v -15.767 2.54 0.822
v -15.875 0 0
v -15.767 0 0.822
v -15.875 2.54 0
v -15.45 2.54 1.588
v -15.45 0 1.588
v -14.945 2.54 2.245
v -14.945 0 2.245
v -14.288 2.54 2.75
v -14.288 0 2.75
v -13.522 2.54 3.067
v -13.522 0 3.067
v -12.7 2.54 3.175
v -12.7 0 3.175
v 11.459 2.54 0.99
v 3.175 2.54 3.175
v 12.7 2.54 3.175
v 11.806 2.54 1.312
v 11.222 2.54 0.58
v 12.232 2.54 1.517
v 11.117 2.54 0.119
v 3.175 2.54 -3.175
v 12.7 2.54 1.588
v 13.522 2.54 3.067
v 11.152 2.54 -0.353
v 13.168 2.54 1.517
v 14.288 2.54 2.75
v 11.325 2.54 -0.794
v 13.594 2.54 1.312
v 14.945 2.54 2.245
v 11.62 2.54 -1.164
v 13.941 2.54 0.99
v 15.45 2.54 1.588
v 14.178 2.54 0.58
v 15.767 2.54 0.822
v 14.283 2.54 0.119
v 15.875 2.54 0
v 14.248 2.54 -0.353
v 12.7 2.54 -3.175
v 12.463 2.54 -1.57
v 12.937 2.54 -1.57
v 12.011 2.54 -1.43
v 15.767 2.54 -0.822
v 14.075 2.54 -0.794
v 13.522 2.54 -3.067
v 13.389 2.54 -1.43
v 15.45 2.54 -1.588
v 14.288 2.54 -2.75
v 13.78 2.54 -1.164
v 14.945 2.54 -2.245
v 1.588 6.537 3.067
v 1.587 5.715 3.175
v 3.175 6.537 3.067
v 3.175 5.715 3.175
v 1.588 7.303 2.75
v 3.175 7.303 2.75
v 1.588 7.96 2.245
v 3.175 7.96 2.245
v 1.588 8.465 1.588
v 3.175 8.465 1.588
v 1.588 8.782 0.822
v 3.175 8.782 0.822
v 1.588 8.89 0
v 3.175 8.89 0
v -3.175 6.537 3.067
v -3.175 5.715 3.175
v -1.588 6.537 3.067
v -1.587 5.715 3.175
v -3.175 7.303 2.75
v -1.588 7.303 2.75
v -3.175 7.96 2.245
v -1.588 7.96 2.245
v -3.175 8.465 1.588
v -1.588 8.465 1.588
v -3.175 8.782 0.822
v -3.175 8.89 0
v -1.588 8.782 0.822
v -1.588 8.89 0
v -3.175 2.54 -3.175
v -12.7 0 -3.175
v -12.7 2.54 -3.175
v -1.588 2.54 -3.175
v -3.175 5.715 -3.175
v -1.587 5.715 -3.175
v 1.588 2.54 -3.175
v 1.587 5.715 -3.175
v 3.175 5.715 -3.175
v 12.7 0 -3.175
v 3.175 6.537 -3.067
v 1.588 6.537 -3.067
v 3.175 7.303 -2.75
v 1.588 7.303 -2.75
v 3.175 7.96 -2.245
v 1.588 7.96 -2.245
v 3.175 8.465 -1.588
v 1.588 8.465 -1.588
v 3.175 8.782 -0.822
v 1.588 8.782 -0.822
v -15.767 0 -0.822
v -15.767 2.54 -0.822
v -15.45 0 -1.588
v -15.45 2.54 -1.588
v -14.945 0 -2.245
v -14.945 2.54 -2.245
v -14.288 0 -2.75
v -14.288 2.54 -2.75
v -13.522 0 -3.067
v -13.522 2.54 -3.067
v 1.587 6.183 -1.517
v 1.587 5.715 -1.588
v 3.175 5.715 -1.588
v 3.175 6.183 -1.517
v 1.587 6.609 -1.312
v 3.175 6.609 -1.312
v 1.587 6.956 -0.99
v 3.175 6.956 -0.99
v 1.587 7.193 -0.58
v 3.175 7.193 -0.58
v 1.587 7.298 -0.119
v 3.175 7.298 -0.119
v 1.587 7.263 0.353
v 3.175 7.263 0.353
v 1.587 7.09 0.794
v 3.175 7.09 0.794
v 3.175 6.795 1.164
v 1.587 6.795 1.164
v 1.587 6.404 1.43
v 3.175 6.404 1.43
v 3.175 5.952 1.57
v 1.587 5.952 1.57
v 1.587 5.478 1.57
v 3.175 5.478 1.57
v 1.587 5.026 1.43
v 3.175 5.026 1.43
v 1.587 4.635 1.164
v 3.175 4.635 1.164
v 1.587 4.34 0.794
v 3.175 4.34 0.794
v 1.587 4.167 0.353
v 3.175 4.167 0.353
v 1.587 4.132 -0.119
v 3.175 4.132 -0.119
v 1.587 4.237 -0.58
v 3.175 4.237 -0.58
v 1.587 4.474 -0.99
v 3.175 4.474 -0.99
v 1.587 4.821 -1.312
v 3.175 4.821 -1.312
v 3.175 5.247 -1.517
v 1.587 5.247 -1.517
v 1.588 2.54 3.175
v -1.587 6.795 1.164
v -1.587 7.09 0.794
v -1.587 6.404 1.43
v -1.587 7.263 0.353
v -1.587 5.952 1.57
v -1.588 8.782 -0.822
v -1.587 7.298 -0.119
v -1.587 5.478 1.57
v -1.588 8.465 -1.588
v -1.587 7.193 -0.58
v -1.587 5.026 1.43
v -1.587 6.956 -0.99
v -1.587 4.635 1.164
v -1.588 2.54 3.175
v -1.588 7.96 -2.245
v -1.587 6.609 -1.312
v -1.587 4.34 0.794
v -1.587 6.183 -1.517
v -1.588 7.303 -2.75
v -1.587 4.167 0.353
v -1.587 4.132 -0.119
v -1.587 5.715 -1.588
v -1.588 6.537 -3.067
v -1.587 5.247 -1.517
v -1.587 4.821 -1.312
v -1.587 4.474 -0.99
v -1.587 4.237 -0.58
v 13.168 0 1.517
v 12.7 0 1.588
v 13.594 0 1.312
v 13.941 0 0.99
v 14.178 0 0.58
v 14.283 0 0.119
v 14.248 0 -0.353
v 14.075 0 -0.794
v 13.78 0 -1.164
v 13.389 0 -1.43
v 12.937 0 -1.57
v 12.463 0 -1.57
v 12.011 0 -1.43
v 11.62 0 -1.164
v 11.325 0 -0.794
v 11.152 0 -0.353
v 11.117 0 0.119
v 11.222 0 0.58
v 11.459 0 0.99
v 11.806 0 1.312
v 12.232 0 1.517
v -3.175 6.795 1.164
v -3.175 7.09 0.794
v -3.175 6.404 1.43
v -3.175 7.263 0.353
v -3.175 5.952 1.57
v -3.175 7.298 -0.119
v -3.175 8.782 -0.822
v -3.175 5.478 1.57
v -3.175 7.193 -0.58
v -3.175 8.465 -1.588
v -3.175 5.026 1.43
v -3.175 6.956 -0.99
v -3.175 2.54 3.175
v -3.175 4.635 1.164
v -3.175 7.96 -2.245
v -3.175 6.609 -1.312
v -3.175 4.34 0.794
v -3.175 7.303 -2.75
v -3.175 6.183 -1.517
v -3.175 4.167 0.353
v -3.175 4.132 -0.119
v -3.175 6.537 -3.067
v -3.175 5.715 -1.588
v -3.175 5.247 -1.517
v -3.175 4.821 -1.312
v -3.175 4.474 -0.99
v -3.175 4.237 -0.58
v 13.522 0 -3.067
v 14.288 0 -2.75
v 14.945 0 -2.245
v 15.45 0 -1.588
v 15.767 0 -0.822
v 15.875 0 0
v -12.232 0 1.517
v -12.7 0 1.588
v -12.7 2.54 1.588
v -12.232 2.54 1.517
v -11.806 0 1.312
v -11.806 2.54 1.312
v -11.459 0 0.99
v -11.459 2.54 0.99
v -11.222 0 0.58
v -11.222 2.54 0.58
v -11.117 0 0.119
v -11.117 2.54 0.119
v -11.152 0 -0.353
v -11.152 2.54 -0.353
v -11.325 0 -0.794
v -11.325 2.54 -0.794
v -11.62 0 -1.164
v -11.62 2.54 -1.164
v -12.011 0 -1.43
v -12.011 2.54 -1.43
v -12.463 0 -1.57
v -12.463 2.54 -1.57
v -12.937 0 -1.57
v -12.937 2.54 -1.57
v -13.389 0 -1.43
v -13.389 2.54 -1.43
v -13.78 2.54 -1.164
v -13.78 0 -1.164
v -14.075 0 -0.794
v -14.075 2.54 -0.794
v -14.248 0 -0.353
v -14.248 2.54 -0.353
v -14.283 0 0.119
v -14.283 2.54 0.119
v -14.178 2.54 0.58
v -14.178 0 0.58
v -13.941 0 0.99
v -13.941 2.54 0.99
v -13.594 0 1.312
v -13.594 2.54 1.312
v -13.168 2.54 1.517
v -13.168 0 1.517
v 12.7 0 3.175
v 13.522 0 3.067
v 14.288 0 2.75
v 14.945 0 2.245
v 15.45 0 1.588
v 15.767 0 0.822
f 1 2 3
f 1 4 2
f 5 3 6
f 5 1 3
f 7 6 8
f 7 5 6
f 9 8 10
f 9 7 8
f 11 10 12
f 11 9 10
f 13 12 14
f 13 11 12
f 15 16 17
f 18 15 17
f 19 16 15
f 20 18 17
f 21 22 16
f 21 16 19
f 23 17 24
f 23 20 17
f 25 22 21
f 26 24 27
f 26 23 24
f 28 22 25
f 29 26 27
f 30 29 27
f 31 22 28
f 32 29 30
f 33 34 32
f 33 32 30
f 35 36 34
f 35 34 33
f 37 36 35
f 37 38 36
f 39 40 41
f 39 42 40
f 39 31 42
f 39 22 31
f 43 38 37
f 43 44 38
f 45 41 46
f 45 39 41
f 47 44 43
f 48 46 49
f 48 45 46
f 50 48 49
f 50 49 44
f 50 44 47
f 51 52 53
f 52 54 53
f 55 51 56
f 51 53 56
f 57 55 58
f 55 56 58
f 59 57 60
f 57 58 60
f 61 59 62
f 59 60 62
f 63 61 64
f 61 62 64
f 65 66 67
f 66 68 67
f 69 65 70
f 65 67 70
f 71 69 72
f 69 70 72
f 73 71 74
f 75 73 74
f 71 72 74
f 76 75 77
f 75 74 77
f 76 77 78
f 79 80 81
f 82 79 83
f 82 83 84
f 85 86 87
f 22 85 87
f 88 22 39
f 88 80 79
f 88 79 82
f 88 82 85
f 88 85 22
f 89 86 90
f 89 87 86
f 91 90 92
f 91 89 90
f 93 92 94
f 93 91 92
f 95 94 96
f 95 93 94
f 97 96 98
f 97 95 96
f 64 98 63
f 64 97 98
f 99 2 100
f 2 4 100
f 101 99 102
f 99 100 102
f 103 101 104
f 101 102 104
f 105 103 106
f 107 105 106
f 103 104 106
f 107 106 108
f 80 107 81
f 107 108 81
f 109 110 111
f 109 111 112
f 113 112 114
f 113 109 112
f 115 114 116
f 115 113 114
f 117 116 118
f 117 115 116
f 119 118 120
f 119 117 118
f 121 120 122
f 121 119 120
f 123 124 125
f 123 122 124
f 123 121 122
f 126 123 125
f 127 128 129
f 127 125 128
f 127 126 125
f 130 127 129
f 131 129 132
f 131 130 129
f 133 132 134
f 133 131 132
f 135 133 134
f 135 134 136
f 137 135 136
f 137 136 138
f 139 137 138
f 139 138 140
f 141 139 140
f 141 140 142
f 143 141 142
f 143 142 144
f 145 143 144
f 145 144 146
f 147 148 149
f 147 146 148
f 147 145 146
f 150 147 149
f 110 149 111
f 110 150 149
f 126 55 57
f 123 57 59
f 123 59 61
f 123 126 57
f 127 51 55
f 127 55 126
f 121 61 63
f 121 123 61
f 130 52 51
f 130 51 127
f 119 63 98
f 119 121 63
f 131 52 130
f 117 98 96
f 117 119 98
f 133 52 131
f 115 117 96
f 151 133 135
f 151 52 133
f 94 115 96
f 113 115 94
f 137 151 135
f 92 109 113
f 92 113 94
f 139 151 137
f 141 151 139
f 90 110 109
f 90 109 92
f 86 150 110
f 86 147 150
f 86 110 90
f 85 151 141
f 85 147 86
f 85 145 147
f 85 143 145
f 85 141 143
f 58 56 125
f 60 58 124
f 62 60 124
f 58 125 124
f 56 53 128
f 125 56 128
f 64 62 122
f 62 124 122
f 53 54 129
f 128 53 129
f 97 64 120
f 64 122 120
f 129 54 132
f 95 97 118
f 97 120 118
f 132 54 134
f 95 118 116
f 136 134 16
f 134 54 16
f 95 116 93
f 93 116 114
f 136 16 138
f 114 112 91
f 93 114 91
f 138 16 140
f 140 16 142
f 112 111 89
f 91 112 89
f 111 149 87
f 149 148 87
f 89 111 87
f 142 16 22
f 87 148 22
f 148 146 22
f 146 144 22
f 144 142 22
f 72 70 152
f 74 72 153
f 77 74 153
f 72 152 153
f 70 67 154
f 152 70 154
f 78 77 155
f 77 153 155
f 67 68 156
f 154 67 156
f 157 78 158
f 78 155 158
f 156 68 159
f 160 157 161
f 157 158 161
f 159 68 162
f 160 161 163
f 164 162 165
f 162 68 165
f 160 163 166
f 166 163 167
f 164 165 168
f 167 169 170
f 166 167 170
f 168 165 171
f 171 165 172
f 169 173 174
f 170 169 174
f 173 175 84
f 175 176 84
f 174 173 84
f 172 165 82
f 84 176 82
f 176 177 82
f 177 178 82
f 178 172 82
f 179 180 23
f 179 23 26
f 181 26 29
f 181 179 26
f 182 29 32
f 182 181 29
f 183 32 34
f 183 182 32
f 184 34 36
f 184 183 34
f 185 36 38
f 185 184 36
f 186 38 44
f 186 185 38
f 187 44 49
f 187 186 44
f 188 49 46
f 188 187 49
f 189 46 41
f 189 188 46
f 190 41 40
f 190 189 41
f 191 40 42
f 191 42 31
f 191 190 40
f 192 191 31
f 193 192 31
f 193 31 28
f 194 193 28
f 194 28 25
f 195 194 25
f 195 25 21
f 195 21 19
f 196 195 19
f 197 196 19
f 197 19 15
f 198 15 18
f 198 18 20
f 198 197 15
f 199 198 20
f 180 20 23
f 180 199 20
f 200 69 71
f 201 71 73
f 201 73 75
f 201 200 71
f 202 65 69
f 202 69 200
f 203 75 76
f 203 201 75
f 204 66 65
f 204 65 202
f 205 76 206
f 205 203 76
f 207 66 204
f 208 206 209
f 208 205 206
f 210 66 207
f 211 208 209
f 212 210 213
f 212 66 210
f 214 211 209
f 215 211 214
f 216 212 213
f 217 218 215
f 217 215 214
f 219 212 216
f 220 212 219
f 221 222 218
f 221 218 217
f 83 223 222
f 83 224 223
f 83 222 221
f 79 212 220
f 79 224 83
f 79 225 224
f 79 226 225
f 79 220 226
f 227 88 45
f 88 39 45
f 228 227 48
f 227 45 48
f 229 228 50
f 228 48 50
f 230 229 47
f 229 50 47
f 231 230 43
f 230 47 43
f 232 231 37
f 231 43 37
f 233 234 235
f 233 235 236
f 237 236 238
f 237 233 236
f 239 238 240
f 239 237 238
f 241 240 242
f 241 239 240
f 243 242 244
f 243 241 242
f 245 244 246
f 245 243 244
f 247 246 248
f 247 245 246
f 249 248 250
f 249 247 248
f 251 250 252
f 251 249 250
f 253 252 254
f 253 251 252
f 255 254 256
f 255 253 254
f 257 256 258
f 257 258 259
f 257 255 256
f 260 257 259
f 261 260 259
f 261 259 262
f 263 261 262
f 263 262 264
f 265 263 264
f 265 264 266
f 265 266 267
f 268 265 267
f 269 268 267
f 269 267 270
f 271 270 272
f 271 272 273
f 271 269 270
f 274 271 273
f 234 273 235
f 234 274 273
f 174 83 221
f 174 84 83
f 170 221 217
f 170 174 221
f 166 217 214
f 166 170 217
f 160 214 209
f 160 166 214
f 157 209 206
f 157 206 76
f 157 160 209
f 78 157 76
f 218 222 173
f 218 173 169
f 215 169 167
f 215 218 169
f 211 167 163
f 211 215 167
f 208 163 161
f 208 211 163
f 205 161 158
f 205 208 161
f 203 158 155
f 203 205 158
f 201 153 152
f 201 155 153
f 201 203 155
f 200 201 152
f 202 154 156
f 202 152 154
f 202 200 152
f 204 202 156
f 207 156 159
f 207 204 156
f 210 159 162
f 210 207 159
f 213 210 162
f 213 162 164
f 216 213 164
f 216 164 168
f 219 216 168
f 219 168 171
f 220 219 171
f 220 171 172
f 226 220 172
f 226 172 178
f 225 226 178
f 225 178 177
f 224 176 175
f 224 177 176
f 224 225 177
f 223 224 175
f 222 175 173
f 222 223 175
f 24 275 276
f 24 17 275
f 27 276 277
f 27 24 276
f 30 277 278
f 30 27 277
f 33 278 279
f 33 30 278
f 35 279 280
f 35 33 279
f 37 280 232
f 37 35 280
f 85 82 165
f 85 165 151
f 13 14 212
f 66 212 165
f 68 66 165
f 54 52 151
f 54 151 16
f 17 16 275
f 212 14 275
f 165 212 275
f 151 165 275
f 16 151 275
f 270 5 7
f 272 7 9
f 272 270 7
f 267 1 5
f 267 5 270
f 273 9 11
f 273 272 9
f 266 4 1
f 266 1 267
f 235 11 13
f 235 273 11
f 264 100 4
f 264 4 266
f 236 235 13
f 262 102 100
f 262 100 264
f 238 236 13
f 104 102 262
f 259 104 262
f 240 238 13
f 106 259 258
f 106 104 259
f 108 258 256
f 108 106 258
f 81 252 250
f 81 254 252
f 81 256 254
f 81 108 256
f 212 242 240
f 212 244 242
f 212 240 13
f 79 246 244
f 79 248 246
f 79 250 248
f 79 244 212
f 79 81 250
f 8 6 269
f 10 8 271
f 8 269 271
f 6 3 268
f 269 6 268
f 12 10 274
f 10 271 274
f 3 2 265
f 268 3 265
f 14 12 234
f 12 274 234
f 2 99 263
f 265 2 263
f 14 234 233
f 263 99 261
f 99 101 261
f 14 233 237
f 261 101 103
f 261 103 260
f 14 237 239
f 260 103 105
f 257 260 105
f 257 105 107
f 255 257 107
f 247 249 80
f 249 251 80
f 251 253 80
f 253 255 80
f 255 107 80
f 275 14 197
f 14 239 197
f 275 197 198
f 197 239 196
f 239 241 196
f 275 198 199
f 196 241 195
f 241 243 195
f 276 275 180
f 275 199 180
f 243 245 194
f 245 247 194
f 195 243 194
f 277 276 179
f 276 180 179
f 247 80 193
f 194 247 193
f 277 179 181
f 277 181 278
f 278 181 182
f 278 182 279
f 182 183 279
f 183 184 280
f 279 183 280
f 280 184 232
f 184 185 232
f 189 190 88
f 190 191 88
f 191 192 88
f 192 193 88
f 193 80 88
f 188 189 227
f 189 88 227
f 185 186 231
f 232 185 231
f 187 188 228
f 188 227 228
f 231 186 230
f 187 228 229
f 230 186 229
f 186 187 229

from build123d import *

# Parameters (mm, degrees)
SKETCH2_W               = 31.75
SKETCH2_H               = 6.35
SKETCH2_R               = 1.5875
BOSS_EXTRUDE1_DEPTH     = 2.54
SKETCH3_W               = 1.5875
SKETCH3_H               = 6.35
BOSS_EXTRUDE2_DEPTH     = 6.35
CUT_EXTRUDE1_DEPTH      = 20.850733771
CUT_EXTRUDE1_DEPTH_BACK = 20.850733771
SKETCH4_R               = 1.5875
FILLET1_R               = 3.175


with BuildPart() as part:
    # Sketch2 → Boss-Extrude1 (new body)
    with BuildSketch(Plane(origin=(0, 0, 0), x_dir=(1, 0, 0), z_dir=(0, 1, 0))):
        Rectangle(SKETCH2_W, SKETCH2_H)
        with Locations(Location((-12.7, 0, 0), (0, 0, 270))):
            Circle(SKETCH2_R, mode=Mode.SUBTRACT)
        with Locations(Location((12.7, 0, 0), (0, 0, 270))):
            Circle(SKETCH2_R, mode=Mode.SUBTRACT)
    extrude(amount=BOSS_EXTRUDE1_DEPTH)

    # Sketch3 → Boss-Extrude2 (add)
    with BuildSketch(Plane(origin=(0, 2.54, 0), x_dir=(1, 0, 0), z_dir=(0, 1, 0))):
        with Locations((-2.38125, 0)):
            Rectangle(SKETCH3_W, SKETCH3_H)
        with Locations((2.38125, 0)):
            Rectangle(SKETCH3_W, SKETCH3_H)
    extrude(amount=BOSS_EXTRUDE2_DEPTH)

    # Sketch4 → Cut-Extrude1 (cut, two sides: drawn at the far end of the back side and taken through both)
    with BuildSketch(Plane(origin=(-1.5875, 0, 0), x_dir=(0, 0, -1), z_dir=(1, 0, 0)).offset(-CUT_EXTRUDE1_DEPTH_BACK)):
        with Locations((0, 5.715)):
            Circle(SKETCH4_R)
    extrude(amount=CUT_EXTRUDE1_DEPTH + CUT_EXTRUDE1_DEPTH_BACK, mode=Mode.SUBTRACT)

    # Fillet1
    fillet1_edges = [part.edges().sort_by_distance(p)[0] for p in [
        (-15.875, 1.27, 3.175),
        (-15.875, 1.27, -3.175),
        (15.875, 1.27, -3.175),
        (15.875, 1.27, 3.175),
        (2.38125, 8.89, 3.175),
        (2.38125, 8.89, -3.175),
        (-2.38125, 8.89, -3.175),
        (-2.38125, 8.89, 3.175),
    ]]
    fillet(fillet1_edges, radius=FILLET1_R - 0.0001)  # a hair under: the kernel refuses the full size


solid = part.part
